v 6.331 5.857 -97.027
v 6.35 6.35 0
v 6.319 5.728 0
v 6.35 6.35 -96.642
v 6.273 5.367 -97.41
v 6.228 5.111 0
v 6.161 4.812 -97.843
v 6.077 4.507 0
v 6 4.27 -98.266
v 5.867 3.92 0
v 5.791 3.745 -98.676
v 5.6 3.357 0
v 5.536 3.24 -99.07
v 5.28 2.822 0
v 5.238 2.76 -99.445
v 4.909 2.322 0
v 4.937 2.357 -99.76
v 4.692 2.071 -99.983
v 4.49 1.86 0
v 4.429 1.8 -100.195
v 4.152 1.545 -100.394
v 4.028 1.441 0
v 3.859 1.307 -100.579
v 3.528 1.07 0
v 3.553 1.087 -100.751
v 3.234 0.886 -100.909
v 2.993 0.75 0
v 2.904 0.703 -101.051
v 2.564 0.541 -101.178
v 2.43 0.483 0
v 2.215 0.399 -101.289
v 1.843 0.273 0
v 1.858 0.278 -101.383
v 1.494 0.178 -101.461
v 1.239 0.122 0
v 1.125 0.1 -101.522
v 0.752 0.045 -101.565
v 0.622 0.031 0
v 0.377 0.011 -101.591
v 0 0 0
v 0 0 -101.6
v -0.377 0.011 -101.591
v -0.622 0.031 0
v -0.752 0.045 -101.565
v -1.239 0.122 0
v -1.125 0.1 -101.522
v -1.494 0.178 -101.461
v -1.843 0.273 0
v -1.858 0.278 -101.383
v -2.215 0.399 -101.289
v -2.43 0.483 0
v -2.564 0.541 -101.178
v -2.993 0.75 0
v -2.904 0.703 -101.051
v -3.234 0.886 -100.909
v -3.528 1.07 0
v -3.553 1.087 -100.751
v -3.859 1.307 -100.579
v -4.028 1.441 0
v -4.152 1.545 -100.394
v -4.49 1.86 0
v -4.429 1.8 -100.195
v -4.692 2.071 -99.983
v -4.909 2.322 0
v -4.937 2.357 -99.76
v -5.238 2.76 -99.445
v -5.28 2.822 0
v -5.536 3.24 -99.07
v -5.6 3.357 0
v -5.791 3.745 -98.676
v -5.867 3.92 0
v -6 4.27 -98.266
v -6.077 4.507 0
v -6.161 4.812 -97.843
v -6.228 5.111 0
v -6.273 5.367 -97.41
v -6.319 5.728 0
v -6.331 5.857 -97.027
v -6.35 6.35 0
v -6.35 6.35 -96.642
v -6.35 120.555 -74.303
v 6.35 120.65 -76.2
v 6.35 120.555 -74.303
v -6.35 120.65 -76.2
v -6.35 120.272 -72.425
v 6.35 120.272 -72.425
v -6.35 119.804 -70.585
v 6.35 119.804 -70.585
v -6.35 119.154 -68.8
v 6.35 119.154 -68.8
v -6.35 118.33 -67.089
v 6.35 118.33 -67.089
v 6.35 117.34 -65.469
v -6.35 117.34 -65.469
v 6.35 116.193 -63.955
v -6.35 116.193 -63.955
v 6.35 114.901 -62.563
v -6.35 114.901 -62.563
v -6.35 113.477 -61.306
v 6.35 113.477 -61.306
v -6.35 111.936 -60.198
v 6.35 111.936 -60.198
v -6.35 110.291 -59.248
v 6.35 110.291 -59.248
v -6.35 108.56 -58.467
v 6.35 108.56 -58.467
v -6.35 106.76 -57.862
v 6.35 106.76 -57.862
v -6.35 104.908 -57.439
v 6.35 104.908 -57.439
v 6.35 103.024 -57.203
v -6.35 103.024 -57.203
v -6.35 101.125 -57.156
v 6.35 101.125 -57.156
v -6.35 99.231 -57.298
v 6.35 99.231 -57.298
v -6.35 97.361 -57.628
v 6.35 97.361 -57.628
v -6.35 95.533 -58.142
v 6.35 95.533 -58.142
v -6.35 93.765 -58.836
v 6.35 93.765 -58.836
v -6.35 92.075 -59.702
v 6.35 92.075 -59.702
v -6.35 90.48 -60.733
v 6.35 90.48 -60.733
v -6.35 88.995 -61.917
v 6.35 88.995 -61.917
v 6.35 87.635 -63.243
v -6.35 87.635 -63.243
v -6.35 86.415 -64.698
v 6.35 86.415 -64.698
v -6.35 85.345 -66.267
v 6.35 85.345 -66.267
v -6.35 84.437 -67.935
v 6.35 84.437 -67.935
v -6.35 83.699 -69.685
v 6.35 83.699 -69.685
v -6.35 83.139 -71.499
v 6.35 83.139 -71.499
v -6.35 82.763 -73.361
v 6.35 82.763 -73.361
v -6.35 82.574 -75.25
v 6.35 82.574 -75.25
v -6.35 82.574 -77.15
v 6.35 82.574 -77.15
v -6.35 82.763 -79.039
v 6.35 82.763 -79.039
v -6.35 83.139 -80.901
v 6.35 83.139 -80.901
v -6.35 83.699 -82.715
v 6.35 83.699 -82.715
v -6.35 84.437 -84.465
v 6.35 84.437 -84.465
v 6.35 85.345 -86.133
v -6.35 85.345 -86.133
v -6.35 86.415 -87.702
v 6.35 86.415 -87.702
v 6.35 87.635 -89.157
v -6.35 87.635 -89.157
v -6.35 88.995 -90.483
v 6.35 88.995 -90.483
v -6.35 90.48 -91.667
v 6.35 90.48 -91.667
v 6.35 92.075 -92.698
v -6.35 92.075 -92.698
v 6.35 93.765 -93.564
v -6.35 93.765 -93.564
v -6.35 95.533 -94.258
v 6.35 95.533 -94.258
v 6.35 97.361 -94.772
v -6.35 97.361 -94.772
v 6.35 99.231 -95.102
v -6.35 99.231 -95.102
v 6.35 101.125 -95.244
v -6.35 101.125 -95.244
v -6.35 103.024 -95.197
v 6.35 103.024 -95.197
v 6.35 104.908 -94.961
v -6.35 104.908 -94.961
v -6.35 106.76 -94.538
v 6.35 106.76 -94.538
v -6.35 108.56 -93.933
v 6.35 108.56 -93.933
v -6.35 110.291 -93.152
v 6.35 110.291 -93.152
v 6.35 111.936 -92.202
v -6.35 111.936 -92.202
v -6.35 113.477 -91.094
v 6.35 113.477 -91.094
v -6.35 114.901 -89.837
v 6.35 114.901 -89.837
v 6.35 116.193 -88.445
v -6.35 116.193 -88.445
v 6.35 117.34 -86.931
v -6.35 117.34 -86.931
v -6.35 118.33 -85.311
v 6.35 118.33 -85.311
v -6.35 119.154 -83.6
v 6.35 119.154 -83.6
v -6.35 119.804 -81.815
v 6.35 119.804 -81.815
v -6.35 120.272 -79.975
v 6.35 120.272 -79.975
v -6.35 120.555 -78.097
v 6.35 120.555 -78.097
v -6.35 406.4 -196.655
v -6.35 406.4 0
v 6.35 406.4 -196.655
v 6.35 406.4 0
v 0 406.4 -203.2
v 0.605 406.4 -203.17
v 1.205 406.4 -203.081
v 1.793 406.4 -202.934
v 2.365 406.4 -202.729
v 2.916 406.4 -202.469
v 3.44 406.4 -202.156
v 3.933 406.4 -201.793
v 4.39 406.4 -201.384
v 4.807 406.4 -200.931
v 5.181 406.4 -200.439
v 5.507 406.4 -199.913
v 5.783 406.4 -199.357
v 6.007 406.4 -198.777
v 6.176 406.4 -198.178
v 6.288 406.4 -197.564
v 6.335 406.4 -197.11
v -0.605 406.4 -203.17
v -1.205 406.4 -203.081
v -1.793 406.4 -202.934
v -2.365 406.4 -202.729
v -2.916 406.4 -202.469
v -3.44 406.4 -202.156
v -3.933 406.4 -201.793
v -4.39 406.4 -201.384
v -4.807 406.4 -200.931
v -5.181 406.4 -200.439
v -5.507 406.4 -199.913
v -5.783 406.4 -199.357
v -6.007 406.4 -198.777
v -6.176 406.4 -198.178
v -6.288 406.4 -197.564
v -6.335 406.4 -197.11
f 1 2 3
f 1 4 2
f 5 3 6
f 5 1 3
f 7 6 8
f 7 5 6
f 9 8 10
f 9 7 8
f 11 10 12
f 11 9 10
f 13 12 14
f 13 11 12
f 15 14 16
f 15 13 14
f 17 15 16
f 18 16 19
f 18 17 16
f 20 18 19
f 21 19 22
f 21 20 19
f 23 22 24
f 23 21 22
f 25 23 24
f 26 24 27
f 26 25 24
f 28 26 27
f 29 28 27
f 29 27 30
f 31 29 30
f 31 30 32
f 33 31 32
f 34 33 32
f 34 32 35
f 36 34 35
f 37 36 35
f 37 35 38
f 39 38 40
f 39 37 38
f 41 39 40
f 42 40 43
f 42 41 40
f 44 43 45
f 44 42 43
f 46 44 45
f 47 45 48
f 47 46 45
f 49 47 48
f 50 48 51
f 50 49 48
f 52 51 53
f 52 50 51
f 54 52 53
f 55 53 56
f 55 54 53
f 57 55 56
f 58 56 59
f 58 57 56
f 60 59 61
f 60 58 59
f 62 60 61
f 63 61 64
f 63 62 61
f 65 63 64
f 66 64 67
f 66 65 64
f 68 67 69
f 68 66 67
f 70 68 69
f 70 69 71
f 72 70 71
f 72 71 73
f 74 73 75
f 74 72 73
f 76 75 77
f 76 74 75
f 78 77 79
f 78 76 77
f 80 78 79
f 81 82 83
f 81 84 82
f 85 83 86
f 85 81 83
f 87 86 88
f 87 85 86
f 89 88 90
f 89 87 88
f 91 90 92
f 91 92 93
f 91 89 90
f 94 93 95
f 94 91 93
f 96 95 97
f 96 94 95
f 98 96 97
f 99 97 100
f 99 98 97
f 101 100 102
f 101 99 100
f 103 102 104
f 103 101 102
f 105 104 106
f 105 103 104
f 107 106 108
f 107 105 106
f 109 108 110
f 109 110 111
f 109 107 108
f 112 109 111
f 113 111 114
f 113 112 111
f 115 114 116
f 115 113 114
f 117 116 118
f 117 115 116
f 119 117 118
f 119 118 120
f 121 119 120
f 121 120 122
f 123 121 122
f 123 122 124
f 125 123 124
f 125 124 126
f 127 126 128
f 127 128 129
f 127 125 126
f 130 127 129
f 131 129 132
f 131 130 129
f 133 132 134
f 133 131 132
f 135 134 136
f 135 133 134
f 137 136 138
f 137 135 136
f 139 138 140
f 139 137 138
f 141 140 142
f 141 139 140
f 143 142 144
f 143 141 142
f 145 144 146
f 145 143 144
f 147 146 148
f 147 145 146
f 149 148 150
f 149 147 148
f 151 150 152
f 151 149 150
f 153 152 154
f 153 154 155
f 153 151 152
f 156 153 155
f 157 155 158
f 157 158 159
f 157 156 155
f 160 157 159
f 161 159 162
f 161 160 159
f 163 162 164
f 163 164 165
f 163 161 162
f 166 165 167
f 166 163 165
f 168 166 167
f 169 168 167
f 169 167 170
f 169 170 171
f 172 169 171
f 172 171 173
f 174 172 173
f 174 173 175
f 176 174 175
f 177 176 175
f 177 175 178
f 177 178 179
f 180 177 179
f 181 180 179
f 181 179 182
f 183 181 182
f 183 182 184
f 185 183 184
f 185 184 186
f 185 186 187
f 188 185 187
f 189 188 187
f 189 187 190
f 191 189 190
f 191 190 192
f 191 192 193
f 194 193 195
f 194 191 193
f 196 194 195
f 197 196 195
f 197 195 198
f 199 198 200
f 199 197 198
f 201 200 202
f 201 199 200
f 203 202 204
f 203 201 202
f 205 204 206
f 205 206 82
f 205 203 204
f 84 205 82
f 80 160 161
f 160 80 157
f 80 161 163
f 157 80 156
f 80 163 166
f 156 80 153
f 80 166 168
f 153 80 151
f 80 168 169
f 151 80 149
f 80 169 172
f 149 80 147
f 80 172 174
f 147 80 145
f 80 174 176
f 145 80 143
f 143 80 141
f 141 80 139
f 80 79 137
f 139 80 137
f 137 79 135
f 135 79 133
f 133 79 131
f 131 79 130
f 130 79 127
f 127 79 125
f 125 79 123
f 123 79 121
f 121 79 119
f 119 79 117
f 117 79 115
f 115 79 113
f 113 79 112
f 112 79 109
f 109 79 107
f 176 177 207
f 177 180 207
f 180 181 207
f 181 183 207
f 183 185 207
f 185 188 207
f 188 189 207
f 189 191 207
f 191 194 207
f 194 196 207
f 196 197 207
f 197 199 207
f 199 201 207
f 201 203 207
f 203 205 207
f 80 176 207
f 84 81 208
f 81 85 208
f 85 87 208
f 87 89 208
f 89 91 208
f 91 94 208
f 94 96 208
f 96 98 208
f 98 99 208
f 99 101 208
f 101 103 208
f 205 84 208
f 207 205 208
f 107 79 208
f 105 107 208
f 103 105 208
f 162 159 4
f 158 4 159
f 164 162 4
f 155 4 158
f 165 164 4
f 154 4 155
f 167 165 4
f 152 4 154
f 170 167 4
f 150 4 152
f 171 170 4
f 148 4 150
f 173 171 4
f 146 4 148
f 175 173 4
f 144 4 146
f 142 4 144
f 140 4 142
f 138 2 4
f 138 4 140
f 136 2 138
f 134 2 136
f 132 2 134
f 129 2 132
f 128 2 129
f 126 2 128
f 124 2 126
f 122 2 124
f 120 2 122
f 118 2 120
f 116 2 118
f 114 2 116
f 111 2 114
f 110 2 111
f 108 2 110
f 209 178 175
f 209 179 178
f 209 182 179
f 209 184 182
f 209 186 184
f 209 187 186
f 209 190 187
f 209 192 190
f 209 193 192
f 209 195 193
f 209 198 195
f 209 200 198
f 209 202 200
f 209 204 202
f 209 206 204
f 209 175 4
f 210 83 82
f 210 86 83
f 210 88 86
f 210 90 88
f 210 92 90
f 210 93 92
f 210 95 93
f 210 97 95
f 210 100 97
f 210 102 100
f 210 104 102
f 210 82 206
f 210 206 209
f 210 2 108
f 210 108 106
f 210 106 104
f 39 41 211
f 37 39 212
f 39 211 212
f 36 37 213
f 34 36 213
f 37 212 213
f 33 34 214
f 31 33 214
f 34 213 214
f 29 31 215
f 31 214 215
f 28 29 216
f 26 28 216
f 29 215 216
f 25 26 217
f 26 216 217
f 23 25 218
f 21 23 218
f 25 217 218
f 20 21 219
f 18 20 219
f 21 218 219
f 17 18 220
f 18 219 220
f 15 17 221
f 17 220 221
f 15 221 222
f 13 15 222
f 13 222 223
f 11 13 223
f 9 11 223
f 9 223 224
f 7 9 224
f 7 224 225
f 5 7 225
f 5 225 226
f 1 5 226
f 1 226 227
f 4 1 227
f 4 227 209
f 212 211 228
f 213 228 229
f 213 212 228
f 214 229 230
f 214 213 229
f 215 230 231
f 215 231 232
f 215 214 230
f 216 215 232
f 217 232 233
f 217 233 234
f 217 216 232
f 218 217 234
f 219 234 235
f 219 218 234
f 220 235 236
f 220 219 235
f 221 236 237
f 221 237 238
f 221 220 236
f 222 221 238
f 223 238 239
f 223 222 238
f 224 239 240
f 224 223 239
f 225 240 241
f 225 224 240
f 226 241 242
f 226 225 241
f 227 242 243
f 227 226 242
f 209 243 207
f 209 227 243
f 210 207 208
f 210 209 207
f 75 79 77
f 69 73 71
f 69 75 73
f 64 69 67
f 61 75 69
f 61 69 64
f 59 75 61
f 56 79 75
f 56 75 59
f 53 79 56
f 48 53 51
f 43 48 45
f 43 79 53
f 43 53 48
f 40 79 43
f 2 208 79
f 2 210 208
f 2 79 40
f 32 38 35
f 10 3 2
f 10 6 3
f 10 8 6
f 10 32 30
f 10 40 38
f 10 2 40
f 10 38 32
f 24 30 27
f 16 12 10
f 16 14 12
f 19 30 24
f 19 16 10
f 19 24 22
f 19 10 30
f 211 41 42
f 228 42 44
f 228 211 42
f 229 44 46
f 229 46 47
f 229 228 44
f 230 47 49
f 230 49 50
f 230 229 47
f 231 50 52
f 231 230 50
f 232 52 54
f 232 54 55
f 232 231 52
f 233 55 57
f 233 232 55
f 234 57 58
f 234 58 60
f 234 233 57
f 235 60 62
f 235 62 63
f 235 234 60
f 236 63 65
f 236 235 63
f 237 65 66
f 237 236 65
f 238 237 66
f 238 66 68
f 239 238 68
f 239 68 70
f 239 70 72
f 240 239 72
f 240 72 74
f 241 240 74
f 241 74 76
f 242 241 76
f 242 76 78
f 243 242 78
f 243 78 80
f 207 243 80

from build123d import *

# Parameters (mm, degrees)
F0_R     = 19.05
F1_DEPTH = 6.35
F2_R     = 6.34999


# Not quite as in the source:
# - a fillet or chamfer is up to 0.001 mm smaller than in the source, because OpenCascade refuses the exact size


with BuildPart() as f1:
    # F0 (on Right) → F1 (new body, symmetric)
    with BuildSketch(Plane.YZ):
        Polygon((406.4, 0), (0, 0), (0, -101.6), (406.4, -203.2), align=None)
        with Locations((101.6, -76.2)):
            Circle(F0_R, mode=Mode.SUBTRACT)
    extrude(amount=F1_DEPTH, both=True)

    # F2 (radius 6.35 in the source; OpenCascade refuses exactly that, so slightly less here)
    f2_edges = [f1.edges().sort_by_distance(p)[0] for p in [
        (-6.35, 203.2, -152.4),
        (6.35, 203.2, -152.4),
        (6.35, 0, -50.8),
        (-6.35, 0, -50.8),
    ]]
    fillet(f2_edges, radius=F2_R)


solid = f1.part
